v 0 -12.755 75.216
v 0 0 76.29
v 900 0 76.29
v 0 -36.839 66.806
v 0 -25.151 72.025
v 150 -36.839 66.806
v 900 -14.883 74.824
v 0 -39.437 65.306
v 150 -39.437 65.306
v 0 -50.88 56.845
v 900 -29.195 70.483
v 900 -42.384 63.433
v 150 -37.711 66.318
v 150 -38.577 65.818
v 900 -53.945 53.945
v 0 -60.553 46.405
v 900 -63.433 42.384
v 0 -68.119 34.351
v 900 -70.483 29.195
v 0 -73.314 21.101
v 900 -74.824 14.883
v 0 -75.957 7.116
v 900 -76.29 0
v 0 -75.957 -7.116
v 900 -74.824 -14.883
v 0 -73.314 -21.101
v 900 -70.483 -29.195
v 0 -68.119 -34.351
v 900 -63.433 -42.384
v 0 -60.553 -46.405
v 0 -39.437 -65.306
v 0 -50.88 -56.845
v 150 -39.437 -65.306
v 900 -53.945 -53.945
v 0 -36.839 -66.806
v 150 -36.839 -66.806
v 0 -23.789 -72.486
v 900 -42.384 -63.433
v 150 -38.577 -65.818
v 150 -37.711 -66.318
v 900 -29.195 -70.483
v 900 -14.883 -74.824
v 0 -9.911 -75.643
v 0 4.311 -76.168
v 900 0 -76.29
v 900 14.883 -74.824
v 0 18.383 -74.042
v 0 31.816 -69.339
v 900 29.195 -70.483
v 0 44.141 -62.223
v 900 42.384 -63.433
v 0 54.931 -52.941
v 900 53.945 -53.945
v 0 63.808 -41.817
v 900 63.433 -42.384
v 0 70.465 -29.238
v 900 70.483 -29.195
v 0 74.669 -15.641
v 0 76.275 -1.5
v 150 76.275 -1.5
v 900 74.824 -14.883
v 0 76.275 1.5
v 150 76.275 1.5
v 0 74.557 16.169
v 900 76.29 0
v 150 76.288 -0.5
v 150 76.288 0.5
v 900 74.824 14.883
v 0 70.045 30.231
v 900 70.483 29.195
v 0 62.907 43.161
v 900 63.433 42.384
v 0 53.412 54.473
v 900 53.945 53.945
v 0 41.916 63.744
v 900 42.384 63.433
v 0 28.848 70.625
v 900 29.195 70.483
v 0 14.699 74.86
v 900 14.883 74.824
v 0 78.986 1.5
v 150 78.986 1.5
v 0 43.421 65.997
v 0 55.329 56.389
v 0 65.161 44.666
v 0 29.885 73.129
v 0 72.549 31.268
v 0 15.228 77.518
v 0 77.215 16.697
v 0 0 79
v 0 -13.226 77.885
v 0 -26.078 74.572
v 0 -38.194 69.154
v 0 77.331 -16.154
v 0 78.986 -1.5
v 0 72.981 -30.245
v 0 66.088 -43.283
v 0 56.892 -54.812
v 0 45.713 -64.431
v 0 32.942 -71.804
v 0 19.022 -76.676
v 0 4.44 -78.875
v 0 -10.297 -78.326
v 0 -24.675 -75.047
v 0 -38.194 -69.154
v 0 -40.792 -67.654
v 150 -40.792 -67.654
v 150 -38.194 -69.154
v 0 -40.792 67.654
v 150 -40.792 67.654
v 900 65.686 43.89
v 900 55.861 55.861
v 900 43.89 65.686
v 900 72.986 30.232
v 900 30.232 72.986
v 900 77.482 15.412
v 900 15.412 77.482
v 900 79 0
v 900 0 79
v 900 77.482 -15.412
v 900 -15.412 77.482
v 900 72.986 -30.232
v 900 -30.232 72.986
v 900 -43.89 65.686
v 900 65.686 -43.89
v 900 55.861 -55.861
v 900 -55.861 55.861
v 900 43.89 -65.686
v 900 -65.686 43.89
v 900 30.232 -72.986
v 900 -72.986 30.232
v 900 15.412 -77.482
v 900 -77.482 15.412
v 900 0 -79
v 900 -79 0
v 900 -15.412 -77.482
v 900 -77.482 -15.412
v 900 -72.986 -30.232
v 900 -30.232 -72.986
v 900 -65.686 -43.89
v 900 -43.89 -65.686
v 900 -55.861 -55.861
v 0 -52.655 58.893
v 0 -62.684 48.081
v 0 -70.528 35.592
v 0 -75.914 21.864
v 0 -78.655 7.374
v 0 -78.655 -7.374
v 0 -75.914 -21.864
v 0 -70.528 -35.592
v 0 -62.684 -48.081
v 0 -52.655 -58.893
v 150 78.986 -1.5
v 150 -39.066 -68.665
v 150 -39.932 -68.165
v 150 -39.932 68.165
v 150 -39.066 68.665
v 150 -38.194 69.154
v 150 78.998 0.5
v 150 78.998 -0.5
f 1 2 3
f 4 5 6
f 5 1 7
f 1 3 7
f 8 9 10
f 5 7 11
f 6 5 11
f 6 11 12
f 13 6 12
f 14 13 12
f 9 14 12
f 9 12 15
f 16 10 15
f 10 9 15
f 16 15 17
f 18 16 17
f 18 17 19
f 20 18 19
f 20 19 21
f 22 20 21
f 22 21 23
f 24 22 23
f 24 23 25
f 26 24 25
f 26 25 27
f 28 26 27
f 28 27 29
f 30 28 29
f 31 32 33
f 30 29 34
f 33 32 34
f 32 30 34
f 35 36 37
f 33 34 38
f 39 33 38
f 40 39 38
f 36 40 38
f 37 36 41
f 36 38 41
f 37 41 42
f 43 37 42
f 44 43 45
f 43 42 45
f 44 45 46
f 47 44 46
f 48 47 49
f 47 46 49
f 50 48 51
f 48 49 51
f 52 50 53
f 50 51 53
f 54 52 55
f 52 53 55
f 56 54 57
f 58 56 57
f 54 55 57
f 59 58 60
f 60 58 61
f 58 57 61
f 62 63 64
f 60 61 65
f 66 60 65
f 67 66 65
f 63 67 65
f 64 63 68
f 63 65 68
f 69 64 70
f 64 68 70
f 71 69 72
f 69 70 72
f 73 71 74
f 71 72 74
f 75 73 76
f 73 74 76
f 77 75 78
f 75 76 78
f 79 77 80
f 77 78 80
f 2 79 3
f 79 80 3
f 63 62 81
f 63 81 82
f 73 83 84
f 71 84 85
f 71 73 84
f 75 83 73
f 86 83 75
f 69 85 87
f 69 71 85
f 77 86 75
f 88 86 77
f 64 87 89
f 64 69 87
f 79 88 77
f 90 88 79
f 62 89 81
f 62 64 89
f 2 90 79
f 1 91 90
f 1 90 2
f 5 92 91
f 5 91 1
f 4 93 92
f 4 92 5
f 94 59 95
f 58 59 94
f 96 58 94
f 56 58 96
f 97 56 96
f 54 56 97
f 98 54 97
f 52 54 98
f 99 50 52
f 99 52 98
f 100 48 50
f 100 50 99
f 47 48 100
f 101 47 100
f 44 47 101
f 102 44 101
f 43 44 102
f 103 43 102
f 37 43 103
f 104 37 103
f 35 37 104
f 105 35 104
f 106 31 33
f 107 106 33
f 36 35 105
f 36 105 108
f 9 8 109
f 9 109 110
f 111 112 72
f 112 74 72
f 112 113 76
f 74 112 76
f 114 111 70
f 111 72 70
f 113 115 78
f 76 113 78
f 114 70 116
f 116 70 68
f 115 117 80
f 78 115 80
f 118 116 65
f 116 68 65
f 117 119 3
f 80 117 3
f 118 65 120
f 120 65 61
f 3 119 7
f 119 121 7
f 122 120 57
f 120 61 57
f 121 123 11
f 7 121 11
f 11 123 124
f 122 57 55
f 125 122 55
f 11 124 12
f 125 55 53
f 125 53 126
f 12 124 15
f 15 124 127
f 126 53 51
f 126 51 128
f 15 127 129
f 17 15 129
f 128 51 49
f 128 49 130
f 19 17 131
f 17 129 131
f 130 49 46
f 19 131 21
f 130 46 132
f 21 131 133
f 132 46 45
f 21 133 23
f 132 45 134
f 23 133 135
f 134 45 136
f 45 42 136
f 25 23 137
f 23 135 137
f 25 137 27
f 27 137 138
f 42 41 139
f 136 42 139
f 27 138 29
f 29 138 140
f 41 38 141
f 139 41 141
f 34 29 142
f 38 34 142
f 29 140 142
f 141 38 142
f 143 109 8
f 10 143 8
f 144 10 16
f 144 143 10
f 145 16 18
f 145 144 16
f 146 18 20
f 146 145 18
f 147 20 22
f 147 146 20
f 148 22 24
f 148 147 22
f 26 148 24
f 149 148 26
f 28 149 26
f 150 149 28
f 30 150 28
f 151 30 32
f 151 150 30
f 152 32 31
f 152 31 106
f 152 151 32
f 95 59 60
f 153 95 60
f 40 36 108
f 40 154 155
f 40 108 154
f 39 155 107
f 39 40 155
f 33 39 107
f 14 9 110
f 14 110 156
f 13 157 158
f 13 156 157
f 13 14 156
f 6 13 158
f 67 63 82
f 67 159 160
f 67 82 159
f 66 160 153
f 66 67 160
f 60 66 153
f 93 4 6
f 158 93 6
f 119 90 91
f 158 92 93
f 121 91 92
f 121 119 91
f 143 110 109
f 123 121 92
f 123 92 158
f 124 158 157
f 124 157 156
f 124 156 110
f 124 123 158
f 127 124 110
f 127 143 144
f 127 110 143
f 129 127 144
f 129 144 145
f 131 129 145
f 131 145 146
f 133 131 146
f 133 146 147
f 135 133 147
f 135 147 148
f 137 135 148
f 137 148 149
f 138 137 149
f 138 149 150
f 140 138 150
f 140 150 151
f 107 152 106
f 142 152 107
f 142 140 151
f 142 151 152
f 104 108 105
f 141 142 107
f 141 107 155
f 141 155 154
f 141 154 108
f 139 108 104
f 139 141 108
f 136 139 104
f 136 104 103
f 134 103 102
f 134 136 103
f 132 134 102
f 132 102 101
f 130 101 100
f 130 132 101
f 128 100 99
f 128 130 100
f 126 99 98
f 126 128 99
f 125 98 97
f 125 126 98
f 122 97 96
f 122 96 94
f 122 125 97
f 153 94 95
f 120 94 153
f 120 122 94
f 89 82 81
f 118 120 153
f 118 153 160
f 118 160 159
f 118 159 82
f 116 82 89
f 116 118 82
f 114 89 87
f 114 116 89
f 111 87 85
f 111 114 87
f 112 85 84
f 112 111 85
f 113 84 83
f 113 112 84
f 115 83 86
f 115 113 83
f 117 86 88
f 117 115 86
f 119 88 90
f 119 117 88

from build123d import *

# Parameters (mm, degrees)
ESQUISSE1_W                  = 900
ESQUISSE1_H                  = 2.71
ESQUISSE2_W                  = 150
ESQUISSE2_H                  = 3
ENL_V_MAT_EXTRU_1_DEPTH      = 907.907933585
R_P_TITION_CIRCULAIRE1_COUNT = 3
R_P_TITION_CIRCULAIRE1_ANGLE = 240


with BuildPart() as part:
    # Esquisse1 → Révolution1 (revolve)
    with BuildSketch(Plane.XY, mode=Mode.PRIVATE) as r_volution1_sk:
        with Locations((450, 77.645)):
            Rectangle(ESQUISSE1_W, ESQUISSE1_H)
    revolve(r_volution1_sk.sketch.rotate(Axis((0, 0, 0), (1, 0, 0)), 90), axis=Axis((0, 0, 0), (1, 0, 0)))

    # Esquisse2 → Enlèv. mat.-Extru.1 (cut, through all)
    with BuildSketch(Plane(origin=(0, 0, 0), x_dir=(1, 0, 0), z_dir=(0, 1, 0))):
        with Locations((75, 0)):
            Rectangle(ESQUISSE2_W, ESQUISSE2_H)
    enl_v_mat_extru_1 = extrude(amount=ENL_V_MAT_EXTRU_1_DEPTH, mode=Mode.SUBTRACT)

    # Répétition circulaire1: Enlèv. mat.-Extru.1 ×3 about axis
    r_p_tition_circulaire1_axis = Axis((0, 0, 0), (-1, 0, 0))
    for i in range(1, R_P_TITION_CIRCULAIRE1_COUNT):
        add(enl_v_mat_extru_1.rotate(r_p_tition_circulaire1_axis, i * R_P_TITION_CIRCULAIRE1_ANGLE / (R_P_TITION_CIRCULAIRE1_COUNT - 1)), mode=Mode.SUBTRACT)


solid = part.part
